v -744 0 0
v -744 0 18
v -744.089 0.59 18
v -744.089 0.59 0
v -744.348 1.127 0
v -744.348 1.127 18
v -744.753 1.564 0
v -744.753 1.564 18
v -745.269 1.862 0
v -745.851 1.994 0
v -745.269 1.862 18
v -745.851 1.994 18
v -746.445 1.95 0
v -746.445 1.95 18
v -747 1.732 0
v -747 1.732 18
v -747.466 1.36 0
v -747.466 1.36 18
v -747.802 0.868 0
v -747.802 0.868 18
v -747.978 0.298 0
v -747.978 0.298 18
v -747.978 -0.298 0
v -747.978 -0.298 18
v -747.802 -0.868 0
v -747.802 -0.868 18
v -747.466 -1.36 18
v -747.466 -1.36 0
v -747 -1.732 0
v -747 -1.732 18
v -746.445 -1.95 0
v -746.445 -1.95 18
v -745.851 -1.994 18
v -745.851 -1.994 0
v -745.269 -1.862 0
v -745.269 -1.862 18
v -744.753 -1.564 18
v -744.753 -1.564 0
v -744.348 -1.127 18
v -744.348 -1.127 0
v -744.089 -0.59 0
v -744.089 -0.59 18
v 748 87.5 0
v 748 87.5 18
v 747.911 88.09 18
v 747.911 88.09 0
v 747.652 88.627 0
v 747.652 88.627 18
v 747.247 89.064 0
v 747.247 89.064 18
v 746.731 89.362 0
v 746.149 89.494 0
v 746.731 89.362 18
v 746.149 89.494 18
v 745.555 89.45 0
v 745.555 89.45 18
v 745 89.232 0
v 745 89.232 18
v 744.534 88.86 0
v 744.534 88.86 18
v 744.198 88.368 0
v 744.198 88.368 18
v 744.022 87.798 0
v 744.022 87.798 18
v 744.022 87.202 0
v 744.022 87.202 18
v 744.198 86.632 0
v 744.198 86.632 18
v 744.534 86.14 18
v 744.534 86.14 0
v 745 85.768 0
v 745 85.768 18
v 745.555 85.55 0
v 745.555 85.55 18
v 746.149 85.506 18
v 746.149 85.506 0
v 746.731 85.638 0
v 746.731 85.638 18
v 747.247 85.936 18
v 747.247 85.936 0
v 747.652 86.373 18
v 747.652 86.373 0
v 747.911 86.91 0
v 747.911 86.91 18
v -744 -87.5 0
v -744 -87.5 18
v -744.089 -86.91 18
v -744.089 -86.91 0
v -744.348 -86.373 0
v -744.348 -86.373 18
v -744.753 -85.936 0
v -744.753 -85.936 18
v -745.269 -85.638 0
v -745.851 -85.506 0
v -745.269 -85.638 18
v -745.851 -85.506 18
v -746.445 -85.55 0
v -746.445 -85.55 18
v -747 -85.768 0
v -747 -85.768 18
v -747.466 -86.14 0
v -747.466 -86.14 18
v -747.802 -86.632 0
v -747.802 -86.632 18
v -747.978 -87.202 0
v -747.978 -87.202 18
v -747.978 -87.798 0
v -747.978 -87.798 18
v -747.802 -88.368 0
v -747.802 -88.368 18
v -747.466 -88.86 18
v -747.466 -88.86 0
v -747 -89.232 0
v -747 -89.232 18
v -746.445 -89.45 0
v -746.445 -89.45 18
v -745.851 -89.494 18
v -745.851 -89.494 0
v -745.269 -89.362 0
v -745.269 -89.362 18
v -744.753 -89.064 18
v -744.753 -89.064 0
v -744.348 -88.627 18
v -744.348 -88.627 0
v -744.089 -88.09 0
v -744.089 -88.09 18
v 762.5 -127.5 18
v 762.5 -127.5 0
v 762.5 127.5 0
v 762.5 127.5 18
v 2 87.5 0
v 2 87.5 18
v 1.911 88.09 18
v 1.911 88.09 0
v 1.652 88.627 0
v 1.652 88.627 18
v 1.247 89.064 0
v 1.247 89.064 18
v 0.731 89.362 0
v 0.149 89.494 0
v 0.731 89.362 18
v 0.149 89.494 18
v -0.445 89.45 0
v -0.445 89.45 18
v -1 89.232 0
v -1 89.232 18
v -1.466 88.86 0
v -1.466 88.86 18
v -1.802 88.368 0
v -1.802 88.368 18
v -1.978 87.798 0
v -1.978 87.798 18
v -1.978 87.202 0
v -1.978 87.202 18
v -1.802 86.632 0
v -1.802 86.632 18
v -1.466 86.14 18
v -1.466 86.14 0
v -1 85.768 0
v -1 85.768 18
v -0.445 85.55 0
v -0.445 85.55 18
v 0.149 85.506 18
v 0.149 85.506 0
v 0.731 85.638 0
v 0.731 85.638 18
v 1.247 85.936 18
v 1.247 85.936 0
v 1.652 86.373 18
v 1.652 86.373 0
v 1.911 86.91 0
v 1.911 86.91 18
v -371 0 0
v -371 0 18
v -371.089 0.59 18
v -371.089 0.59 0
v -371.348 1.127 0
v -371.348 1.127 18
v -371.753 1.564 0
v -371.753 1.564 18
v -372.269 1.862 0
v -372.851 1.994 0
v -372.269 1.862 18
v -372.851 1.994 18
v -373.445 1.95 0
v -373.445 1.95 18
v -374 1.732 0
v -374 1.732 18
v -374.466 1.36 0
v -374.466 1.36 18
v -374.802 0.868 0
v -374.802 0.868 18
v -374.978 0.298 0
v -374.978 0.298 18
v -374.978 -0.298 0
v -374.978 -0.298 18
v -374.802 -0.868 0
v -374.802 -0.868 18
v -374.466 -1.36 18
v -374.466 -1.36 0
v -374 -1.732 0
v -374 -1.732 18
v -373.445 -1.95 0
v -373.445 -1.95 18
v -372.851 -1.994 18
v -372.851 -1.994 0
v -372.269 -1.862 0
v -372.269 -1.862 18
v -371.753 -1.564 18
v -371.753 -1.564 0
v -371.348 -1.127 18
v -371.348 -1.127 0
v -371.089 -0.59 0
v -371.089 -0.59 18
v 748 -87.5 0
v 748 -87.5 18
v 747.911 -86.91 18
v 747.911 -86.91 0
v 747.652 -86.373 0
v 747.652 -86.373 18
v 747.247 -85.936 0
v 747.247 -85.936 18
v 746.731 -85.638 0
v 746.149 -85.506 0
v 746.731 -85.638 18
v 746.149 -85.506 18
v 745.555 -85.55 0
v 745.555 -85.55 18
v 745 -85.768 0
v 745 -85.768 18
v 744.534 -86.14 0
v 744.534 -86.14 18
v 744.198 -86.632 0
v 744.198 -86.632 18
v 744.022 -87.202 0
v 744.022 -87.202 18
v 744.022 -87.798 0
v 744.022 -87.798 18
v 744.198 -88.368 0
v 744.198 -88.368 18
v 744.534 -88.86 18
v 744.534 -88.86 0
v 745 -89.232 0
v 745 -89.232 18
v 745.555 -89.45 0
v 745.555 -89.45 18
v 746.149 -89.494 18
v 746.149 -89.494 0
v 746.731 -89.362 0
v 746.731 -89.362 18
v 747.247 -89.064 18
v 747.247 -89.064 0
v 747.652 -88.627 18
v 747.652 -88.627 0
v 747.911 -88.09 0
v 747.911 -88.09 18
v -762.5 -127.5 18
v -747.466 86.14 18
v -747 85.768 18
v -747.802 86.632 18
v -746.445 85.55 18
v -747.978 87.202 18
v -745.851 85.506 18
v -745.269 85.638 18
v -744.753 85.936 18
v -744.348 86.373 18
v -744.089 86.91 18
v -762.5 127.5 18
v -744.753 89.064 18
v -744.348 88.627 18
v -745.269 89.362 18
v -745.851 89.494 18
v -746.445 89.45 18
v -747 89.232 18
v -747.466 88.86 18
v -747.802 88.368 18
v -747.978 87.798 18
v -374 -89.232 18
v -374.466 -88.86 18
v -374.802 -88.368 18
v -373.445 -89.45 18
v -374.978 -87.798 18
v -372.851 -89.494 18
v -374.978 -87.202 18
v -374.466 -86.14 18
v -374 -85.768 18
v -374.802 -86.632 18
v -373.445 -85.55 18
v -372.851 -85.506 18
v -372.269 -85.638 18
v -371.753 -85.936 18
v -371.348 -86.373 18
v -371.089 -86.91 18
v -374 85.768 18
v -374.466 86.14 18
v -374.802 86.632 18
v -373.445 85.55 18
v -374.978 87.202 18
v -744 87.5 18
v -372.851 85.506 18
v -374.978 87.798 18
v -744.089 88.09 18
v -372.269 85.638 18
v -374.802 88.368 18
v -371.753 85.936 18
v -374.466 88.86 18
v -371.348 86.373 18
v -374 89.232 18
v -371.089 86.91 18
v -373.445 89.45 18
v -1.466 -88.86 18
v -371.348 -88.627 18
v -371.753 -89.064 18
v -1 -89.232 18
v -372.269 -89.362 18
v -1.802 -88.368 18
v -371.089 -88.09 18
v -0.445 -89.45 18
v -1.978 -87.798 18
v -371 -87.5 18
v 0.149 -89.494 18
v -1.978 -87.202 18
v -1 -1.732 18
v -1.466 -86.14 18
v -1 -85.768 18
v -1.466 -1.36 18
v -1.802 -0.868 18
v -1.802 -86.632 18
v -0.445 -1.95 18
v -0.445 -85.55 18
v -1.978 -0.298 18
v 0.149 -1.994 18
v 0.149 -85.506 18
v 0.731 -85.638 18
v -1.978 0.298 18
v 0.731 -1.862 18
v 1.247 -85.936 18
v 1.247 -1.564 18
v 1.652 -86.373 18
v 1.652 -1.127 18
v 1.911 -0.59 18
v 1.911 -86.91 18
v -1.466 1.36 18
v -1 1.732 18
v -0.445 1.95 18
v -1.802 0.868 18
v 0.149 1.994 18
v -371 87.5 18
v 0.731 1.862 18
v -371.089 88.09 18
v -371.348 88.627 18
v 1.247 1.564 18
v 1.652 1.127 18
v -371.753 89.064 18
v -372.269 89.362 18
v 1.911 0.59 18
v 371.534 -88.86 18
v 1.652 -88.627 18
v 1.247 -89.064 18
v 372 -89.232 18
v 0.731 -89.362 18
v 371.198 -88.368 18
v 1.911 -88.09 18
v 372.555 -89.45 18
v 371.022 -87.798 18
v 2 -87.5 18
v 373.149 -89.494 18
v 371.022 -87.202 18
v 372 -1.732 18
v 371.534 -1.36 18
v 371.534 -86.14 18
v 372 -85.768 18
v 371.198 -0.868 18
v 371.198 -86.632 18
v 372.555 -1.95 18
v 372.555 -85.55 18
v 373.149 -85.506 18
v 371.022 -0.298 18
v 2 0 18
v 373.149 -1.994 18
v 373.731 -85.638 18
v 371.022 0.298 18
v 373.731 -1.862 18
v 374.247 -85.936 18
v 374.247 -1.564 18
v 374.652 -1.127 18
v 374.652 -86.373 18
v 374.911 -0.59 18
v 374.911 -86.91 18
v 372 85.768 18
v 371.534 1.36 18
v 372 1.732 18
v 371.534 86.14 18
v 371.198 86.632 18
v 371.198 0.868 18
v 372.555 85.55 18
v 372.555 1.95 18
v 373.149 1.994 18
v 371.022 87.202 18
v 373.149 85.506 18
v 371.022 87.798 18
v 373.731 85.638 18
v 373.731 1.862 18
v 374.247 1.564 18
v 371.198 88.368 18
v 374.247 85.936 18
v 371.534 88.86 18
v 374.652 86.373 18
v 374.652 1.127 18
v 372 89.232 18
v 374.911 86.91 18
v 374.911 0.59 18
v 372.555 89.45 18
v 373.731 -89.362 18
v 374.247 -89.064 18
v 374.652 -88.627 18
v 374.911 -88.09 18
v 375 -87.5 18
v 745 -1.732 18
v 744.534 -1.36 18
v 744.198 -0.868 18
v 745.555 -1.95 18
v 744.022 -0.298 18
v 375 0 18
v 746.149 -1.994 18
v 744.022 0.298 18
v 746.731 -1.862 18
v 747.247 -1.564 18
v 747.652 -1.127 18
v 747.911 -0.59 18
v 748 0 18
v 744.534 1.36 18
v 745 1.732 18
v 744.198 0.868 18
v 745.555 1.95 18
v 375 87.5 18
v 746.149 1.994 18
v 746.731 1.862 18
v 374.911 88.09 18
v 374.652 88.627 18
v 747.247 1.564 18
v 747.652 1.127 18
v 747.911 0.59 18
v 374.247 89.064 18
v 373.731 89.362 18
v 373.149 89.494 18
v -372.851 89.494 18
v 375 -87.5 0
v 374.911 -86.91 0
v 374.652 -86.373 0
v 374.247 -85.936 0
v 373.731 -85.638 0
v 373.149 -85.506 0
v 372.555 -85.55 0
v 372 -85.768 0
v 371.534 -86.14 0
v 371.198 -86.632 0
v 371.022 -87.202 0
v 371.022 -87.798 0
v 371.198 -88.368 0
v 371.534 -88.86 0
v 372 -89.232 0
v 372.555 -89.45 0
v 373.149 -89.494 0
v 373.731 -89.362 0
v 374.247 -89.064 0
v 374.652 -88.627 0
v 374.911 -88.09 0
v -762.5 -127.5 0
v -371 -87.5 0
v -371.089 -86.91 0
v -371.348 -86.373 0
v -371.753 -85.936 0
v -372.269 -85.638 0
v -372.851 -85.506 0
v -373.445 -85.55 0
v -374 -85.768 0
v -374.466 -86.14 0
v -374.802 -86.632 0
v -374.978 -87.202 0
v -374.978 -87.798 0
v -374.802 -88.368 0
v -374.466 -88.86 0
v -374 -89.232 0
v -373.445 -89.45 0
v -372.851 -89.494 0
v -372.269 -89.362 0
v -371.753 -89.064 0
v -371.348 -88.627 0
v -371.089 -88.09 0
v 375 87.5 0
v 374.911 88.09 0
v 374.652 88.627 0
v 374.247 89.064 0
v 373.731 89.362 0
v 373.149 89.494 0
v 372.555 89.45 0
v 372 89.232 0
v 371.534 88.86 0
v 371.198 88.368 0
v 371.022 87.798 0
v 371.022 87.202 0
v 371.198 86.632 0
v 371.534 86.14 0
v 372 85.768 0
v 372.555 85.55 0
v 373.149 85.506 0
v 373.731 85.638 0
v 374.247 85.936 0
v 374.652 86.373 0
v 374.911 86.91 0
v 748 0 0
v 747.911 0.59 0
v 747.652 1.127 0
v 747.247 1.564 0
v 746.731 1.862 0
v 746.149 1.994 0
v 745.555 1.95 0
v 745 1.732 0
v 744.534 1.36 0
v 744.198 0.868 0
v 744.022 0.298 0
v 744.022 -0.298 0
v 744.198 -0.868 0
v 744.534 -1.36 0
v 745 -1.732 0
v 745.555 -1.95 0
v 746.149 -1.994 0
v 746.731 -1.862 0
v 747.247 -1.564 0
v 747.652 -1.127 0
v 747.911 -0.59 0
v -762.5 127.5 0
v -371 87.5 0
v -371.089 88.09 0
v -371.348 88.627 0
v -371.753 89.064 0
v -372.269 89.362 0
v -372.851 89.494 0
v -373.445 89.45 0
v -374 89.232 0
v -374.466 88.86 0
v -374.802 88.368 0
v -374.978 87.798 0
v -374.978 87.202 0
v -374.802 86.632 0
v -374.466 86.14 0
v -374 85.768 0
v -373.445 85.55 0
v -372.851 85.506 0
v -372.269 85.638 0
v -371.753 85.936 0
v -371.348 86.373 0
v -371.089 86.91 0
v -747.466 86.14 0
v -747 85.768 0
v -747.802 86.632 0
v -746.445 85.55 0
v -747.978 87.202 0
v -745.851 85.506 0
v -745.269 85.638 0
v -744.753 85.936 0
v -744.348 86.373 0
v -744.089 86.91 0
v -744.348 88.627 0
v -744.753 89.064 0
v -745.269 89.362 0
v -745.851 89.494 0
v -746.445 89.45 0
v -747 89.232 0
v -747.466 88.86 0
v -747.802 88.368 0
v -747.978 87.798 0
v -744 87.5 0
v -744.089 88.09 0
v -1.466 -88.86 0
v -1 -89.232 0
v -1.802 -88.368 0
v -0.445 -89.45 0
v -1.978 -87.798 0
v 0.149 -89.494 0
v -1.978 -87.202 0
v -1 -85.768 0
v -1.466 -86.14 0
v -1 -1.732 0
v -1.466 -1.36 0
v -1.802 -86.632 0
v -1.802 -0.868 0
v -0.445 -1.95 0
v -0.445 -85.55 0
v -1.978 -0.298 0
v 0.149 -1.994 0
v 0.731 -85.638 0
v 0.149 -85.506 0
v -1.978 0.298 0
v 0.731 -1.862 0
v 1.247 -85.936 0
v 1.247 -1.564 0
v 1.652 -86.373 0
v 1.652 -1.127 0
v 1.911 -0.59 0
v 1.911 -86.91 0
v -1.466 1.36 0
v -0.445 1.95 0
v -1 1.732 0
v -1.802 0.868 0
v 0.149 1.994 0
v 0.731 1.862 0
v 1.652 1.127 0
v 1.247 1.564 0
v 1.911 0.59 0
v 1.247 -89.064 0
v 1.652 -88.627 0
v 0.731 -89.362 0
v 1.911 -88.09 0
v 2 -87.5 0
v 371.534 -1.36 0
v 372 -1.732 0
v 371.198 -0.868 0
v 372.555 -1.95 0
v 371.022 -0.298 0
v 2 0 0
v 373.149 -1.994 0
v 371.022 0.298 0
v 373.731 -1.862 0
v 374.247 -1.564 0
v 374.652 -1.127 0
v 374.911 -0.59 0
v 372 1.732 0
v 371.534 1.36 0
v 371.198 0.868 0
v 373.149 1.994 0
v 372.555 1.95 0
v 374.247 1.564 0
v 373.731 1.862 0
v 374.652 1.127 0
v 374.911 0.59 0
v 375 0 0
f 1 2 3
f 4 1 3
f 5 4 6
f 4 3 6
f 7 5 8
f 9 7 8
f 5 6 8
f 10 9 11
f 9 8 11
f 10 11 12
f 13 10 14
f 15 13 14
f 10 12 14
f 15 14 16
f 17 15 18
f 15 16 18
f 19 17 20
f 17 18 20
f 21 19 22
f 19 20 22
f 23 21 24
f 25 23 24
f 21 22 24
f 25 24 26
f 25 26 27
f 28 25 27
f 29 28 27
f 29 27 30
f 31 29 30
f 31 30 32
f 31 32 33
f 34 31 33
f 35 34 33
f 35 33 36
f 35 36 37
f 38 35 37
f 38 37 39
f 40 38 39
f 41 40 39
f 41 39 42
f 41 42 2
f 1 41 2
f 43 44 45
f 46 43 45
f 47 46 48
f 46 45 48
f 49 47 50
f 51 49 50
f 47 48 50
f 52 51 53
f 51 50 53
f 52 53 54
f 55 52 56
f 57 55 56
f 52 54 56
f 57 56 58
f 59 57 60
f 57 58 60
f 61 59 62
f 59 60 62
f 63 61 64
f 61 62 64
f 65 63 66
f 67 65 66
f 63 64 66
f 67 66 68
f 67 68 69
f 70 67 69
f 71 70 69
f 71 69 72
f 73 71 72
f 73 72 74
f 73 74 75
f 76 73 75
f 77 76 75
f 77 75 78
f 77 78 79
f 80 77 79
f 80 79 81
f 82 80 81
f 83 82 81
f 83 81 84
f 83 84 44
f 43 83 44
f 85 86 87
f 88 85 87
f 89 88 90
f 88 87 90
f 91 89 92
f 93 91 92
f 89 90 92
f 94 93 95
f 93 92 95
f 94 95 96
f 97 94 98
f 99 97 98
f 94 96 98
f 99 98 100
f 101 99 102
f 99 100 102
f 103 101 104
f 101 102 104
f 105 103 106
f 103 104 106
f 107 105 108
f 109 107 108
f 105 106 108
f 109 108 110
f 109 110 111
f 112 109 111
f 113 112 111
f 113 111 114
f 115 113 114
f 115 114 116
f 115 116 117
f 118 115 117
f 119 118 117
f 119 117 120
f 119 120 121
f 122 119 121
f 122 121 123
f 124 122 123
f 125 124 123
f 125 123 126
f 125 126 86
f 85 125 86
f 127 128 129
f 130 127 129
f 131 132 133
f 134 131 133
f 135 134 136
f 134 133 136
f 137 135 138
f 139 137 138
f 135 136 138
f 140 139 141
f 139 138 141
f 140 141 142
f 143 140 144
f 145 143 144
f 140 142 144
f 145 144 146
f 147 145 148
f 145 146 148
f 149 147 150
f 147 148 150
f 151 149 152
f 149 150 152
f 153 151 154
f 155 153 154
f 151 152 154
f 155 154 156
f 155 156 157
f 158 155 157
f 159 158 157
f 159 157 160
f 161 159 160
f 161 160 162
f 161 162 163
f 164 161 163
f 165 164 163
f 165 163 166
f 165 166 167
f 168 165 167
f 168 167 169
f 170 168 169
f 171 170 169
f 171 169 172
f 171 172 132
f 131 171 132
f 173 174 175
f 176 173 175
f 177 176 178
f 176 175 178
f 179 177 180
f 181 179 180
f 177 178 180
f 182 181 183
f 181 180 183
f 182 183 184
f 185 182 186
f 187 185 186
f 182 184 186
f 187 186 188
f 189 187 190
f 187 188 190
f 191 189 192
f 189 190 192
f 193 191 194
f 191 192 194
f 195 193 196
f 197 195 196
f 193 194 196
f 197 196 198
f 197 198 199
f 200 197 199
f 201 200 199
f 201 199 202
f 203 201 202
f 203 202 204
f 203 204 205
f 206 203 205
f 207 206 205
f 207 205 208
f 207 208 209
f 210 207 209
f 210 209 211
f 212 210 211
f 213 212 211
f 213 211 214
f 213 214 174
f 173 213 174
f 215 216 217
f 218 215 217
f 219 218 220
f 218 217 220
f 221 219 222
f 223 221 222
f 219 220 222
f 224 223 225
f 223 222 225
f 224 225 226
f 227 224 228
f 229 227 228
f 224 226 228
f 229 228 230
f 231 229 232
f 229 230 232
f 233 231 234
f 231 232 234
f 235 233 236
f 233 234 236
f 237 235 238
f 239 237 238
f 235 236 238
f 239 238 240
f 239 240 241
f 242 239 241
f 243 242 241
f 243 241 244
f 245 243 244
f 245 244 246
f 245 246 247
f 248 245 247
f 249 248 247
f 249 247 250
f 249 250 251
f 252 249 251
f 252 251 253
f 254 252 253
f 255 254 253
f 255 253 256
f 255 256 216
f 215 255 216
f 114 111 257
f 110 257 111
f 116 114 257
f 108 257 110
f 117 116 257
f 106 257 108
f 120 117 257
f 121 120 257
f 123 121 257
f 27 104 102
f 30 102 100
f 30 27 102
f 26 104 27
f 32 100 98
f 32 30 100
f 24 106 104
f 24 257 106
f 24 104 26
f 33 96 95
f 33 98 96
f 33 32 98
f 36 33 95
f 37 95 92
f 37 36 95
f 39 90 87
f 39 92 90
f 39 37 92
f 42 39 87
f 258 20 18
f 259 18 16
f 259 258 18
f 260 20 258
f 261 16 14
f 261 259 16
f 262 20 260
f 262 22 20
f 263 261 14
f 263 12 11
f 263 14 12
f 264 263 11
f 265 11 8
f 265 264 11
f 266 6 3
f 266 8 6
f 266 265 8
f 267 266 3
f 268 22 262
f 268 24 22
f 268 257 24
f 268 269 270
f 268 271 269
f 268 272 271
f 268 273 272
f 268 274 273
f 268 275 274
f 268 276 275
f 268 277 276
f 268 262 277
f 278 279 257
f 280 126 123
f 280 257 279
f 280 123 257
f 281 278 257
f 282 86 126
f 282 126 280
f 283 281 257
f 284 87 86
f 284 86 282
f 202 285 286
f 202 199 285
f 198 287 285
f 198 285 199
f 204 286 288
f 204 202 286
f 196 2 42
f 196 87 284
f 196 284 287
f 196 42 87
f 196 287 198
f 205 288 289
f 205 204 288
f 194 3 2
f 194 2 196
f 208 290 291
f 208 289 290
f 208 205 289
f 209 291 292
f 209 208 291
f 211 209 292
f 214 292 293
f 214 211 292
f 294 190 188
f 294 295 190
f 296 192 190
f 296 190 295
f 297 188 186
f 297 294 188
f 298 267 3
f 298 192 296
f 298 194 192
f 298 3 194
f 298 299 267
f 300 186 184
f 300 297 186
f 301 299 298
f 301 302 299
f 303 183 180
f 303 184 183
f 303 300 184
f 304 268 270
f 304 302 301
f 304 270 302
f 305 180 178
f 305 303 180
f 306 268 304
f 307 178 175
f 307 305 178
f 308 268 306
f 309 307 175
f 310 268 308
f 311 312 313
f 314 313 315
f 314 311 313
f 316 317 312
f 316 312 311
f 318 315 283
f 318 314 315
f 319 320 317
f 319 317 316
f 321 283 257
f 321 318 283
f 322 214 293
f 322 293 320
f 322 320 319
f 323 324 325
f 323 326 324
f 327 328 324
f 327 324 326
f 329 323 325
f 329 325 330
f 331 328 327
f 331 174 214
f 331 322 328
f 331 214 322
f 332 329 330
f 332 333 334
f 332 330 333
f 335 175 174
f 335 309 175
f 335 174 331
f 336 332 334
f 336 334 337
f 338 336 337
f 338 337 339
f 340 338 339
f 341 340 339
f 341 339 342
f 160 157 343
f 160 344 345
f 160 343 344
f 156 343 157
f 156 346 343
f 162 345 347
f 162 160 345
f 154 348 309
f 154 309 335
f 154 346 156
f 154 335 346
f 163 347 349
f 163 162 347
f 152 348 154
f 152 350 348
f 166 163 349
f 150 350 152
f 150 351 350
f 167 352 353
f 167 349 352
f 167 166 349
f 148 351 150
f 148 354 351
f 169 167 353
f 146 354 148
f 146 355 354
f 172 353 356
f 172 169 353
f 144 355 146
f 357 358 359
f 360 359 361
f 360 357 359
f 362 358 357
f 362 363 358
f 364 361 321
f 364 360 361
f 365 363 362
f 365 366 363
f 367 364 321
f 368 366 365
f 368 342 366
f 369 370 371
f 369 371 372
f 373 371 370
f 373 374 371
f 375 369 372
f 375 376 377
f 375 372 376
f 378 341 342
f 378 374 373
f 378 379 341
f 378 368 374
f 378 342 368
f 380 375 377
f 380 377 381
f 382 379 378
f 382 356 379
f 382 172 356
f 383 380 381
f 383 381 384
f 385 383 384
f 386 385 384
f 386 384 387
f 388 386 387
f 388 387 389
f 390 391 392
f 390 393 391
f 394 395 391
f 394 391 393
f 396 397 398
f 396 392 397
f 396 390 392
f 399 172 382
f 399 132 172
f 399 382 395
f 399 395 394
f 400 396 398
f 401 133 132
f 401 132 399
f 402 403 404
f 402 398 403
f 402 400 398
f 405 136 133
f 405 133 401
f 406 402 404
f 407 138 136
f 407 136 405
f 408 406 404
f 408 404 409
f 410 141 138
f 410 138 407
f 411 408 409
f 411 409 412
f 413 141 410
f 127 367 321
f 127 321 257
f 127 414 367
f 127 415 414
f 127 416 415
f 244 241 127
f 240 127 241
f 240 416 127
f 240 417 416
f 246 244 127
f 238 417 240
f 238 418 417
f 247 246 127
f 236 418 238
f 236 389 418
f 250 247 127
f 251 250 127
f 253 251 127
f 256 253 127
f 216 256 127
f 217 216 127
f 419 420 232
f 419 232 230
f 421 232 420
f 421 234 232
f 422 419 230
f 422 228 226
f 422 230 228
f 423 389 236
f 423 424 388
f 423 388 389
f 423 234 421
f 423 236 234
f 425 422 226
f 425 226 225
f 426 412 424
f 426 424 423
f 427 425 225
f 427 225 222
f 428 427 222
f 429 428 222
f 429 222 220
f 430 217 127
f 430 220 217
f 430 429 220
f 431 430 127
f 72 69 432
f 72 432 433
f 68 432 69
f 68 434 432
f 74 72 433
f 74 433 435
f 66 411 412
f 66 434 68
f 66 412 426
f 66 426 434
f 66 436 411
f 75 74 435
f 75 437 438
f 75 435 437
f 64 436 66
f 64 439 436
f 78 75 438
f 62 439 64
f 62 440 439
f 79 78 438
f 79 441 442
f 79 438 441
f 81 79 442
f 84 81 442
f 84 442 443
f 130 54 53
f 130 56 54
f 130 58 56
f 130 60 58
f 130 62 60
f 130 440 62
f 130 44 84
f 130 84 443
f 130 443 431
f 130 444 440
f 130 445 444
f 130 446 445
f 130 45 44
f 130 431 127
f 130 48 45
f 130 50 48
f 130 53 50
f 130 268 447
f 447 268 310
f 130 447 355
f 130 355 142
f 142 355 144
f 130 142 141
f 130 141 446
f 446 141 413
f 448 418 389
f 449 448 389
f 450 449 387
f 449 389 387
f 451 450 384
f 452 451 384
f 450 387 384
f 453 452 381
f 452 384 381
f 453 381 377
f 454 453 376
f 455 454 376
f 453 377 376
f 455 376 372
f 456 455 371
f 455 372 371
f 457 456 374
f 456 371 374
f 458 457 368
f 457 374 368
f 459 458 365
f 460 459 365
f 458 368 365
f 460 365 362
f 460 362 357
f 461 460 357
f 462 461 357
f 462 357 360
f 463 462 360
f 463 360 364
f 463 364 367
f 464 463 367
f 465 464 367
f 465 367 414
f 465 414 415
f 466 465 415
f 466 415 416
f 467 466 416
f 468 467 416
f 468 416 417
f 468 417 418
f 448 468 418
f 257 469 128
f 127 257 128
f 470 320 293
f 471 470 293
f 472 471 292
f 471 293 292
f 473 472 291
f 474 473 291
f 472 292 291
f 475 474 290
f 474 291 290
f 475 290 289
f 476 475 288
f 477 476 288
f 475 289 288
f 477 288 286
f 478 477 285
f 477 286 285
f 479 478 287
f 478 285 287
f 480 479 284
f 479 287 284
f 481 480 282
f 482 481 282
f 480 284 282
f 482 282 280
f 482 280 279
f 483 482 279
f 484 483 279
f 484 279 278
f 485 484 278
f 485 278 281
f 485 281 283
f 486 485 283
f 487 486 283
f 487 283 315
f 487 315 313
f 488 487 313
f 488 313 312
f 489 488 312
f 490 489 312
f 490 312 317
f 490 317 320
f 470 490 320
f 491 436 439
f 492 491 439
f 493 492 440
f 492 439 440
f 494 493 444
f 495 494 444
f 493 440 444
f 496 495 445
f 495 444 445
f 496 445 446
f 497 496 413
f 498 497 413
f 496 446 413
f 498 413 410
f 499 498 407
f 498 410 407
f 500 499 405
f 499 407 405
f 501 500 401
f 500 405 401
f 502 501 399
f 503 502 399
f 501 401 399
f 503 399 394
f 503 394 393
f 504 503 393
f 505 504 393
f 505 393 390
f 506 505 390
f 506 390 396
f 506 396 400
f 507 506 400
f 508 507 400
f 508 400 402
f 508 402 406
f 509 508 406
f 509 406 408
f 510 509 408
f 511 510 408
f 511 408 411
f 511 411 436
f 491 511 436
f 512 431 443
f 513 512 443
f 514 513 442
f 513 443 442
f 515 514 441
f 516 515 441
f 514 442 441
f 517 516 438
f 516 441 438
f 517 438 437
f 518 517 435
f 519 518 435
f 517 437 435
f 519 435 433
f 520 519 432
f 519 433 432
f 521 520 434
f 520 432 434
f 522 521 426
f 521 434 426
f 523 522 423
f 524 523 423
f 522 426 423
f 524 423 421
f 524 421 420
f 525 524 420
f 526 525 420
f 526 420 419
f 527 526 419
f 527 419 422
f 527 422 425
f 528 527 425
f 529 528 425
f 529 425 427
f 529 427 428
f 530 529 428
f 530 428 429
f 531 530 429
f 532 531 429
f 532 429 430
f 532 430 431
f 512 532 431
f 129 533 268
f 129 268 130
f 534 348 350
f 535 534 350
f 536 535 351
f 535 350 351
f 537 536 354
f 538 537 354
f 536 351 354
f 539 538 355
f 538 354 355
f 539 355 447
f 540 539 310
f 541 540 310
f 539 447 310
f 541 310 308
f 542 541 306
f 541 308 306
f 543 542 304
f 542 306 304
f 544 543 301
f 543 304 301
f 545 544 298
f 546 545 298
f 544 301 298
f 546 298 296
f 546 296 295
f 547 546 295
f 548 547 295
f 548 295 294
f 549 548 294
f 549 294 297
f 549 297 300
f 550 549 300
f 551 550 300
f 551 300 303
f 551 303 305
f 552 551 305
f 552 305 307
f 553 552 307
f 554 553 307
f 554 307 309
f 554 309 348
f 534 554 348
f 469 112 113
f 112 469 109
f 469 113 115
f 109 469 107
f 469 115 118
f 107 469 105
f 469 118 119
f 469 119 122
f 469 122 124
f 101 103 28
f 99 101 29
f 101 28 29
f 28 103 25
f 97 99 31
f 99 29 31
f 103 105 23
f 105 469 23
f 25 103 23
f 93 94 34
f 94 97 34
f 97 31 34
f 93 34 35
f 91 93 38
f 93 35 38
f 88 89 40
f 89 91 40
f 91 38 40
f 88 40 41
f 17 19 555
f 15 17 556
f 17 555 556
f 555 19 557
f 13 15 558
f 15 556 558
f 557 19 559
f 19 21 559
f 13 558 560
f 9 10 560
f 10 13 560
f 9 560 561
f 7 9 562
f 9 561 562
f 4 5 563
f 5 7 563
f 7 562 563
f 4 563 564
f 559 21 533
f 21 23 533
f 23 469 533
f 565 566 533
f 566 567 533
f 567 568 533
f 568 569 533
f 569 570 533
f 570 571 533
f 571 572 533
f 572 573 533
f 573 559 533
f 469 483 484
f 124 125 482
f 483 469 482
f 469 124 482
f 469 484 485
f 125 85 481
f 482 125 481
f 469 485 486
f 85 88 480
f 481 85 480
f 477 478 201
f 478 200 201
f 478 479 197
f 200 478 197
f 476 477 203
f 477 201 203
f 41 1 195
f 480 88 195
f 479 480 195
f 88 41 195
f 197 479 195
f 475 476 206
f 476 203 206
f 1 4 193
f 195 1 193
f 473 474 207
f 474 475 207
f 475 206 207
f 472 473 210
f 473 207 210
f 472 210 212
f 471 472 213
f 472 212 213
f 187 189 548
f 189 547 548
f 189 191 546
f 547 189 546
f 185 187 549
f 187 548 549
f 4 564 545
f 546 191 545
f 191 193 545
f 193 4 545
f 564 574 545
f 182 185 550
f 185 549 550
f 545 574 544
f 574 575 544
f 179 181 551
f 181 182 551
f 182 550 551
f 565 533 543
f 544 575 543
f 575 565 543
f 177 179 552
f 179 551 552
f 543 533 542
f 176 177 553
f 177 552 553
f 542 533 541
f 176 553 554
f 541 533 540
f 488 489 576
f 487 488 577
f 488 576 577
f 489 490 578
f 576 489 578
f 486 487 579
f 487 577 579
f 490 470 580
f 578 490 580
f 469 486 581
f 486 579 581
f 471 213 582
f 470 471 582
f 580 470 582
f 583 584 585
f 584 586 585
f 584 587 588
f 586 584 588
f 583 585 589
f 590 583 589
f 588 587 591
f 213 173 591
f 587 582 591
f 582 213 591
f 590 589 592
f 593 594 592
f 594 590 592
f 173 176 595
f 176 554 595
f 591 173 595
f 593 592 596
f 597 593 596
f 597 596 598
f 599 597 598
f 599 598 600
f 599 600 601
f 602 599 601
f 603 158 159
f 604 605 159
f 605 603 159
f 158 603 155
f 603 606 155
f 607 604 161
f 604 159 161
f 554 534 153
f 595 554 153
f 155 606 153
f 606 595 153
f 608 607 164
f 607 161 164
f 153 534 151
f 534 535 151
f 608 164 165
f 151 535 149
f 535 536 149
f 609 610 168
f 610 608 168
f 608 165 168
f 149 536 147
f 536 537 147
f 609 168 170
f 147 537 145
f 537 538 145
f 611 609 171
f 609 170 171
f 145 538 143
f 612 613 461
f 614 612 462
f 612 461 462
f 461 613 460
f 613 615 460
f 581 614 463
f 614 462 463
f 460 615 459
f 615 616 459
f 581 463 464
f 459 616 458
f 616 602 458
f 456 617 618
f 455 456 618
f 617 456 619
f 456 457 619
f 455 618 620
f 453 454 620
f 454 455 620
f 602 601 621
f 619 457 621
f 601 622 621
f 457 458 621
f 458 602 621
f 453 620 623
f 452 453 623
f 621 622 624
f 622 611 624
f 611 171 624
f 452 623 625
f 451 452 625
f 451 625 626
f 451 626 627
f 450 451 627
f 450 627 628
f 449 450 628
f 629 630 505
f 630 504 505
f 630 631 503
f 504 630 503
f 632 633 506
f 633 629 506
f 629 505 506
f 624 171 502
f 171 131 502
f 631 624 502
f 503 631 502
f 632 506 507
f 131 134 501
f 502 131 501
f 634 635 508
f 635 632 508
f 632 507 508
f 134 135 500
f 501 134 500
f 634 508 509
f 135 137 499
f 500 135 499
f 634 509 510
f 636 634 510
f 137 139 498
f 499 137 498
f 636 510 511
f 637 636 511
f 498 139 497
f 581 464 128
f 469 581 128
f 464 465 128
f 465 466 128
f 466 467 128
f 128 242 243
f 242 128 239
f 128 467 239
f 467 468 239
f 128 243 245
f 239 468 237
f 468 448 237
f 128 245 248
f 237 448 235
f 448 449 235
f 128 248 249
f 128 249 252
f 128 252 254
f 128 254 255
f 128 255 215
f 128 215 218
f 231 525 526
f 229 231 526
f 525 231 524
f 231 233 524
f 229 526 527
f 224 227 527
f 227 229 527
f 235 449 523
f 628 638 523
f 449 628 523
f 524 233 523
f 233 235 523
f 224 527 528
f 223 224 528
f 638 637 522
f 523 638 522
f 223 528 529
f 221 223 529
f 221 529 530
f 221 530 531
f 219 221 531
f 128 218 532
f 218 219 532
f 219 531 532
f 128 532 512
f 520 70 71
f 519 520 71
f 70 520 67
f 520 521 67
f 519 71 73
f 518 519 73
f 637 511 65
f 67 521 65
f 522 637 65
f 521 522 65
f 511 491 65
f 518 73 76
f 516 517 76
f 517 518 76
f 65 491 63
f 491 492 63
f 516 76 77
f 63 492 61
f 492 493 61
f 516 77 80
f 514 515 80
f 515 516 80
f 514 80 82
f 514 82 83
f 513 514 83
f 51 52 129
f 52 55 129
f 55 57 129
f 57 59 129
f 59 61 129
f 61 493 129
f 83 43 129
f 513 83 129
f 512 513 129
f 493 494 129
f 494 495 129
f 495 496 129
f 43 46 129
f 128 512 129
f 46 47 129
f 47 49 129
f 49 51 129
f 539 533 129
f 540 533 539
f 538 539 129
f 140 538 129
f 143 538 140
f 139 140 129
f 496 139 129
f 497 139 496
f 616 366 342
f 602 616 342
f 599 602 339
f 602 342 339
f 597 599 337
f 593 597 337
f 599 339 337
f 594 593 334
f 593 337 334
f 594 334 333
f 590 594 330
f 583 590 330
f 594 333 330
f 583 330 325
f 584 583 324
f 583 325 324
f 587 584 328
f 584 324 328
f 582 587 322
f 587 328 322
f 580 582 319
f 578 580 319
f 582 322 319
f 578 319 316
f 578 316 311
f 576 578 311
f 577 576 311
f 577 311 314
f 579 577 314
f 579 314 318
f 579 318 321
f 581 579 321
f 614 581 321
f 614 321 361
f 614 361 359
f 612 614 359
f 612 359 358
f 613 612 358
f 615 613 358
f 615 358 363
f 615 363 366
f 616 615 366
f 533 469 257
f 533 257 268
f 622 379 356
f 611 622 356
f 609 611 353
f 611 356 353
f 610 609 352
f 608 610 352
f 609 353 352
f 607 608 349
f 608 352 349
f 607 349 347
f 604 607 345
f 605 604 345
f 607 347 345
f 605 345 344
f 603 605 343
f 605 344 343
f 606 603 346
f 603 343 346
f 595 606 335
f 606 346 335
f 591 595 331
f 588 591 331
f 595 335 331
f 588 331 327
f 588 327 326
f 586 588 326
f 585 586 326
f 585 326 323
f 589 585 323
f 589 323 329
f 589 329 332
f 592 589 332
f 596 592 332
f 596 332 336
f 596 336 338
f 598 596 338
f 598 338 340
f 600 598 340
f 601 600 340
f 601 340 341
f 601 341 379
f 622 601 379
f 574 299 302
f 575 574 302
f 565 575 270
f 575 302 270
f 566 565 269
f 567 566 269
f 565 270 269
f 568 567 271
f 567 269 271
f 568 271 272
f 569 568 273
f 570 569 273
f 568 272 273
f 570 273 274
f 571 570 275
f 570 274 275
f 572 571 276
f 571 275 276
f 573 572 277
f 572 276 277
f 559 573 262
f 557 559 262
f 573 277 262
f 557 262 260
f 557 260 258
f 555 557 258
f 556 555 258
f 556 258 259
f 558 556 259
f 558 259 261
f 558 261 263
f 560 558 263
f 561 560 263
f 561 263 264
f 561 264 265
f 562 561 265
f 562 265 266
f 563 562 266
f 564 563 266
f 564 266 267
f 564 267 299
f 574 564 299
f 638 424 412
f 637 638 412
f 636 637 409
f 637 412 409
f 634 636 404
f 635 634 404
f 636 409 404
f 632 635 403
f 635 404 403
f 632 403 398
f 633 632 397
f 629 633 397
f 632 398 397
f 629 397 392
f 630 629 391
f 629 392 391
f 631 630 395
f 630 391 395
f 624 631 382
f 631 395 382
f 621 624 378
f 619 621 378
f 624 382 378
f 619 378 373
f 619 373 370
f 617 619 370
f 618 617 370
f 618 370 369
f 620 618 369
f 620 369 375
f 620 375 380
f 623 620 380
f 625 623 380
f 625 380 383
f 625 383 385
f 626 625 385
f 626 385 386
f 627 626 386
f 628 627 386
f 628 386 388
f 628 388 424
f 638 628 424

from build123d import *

# Parameters (mm, degrees)
SKIZZE1_W                       = 1525
SKIZZE1_H                       = 255
AUFSATZ_LINEAR_AUSTRAGEN1_DEPTH = 18
SCHNITT_LINEAR_AUSTRAGEN1_REACH = 20
SKIZZE3_R                       = 2


with BuildPart() as part:
    # Skizze1 → Aufsatz-Linear austragen1 (new body)
    with BuildSketch(Plane.XY):
        Rectangle(SKIZZE1_W, SKIZZE1_H)
    extrude(amount=AUFSATZ_LINEAR_AUSTRAGEN1_DEPTH)

    # Skizze3 → Schnitt-Linear austragen1 (cut, up to next)
    with BuildSketch(Plane.XY.offset(18), mode=Mode.PRIVATE) as schnitt_linear_austragen1_sk1:
        with Locations((-746, 87.5)):
            Circle(SKIZZE3_R)
    schnitt_linear_austragen1_tool1 = extrude(schnitt_linear_austragen1_sk1.sketch, amount=-SCHNITT_LINEAR_AUSTRAGEN1_REACH, mode=Mode.PRIVATE) & part.part
    add(schnitt_linear_austragen1_tool1.solids().sort_by_distance((-746, 87.5, 18))[0], mode=Mode.SUBTRACT)
    # Skizze3 → Schnitt-Linear austragen1 (cut, up to next)
    with BuildSketch(Plane.XY.offset(18), mode=Mode.PRIVATE) as schnitt_linear_austragen1_sk2:
        with Locations((-746, 0)):
            Circle(SKIZZE3_R)
    schnitt_linear_austragen1_tool2 = extrude(schnitt_linear_austragen1_sk2.sketch, amount=-SCHNITT_LINEAR_AUSTRAGEN1_REACH, mode=Mode.PRIVATE) & part.part
    add(schnitt_linear_austragen1_tool2.solids().sort_by_distance((-746, 0, 18))[0], mode=Mode.SUBTRACT)
    # Skizze3 → Schnitt-Linear austragen1 (cut, up to next)
    with BuildSketch(Plane.XY.offset(18), mode=Mode.PRIVATE) as schnitt_linear_austragen1_sk3:
        with Locations((-746, -87.5)):
            Circle(SKIZZE3_R)
    schnitt_linear_austragen1_tool3 = extrude(schnitt_linear_austragen1_sk3.sketch, amount=-SCHNITT_LINEAR_AUSTRAGEN1_REACH, mode=Mode.PRIVATE) & part.part
    add(schnitt_linear_austragen1_tool3.solids().sort_by_distance((-746, -87.5, 18))[0], mode=Mode.SUBTRACT)
    # Skizze3 → Schnitt-Linear austragen1 (cut, up to next)
    with BuildSketch(Plane.XY.offset(18), mode=Mode.PRIVATE) as schnitt_linear_austragen1_sk4:
        with Locations((-373, -87.5)):
            Circle(SKIZZE3_R)
    schnitt_linear_austragen1_tool4 = extrude(schnitt_linear_austragen1_sk4.sketch, amount=-SCHNITT_LINEAR_AUSTRAGEN1_REACH, mode=Mode.PRIVATE) & part.part
    add(schnitt_linear_austragen1_tool4.solids().sort_by_distance((-373, -87.5, 18))[0], mode=Mode.SUBTRACT)
    # Skizze3 → Schnitt-Linear austragen1 (cut, up to next)
    with BuildSketch(Plane.XY.offset(18), mode=Mode.PRIVATE) as schnitt_linear_austragen1_sk5:
        with Locations((-373, 0)):
            Circle(SKIZZE3_R)
    schnitt_linear_austragen1_tool5 = extrude(schnitt_linear_austragen1_sk5.sketch, amount=-SCHNITT_LINEAR_AUSTRAGEN1_REACH, mode=Mode.PRIVATE) & part.part
    add(schnitt_linear_austragen1_tool5.solids().sort_by_distance((-373, 0, 18))[0], mode=Mode.SUBTRACT)
    # Skizze3 → Schnitt-Linear austragen1 (cut, up to next)
    with BuildSketch(Plane.XY.offset(18), mode=Mode.PRIVATE) as schnitt_linear_austragen1_sk6:
        with Locations((-373, 87.5)):
            Circle(SKIZZE3_R)
    schnitt_linear_austragen1_tool6 = extrude(schnitt_linear_austragen1_sk6.sketch, amount=-SCHNITT_LINEAR_AUSTRAGEN1_REACH, mode=Mode.PRIVATE) & part.part
    add(schnitt_linear_austragen1_tool6.solids().sort_by_distance((-373, 87.5, 18))[0], mode=Mode.SUBTRACT)
    # Skizze3 → Schnitt-Linear austragen1 (cut, up to next)
    with BuildSketch(Plane.XY.offset(18), mode=Mode.PRIVATE) as schnitt_linear_austragen1_sk7:
        with Locations((0, -87.5)):
            Circle(SKIZZE3_R)
    schnitt_linear_austragen1_tool7 = extrude(schnitt_linear_austragen1_sk7.sketch, amount=-SCHNITT_LINEAR_AUSTRAGEN1_REACH, mode=Mode.PRIVATE) & part.part
    add(schnitt_linear_austragen1_tool7.solids().sort_by_distance((0, -87.5, 18))[0], mode=Mode.SUBTRACT)
    # Skizze3 → Schnitt-Linear austragen1 (cut, up to next)
    with BuildSketch(Plane.XY.offset(18), mode=Mode.PRIVATE) as schnitt_linear_austragen1_sk8:
        Circle(SKIZZE3_R)
    schnitt_linear_austragen1_tool8 = extrude(schnitt_linear_austragen1_sk8.sketch, amount=-SCHNITT_LINEAR_AUSTRAGEN1_REACH, mode=Mode.PRIVATE) & part.part
    add(schnitt_linear_austragen1_tool8.solids().sort_by_distance((0, 0, 18))[0], mode=Mode.SUBTRACT)
    # Skizze3 → Schnitt-Linear austragen1 (cut, up to next)
    with BuildSketch(Plane.XY.offset(18), mode=Mode.PRIVATE) as schnitt_linear_austragen1_sk9:
        with Locations((0, 87.5)):
            Circle(SKIZZE3_R)
    schnitt_linear_austragen1_tool9 = extrude(schnitt_linear_austragen1_sk9.sketch, amount=-SCHNITT_LINEAR_AUSTRAGEN1_REACH, mode=Mode.PRIVATE) & part.part
    add(schnitt_linear_austragen1_tool9.solids().sort_by_distance((0, 87.5, 18))[0], mode=Mode.SUBTRACT)
    # Skizze3 → Schnitt-Linear austragen1 (cut, up to next)
    with BuildSketch(Plane.XY.offset(18), mode=Mode.PRIVATE) as schnitt_linear_austragen1_sk10:
        with Locations((373, -87.5)):
            Circle(SKIZZE3_R)
    schnitt_linear_austragen1_tool10 = extrude(schnitt_linear_austragen1_sk10.sketch, amount=-SCHNITT_LINEAR_AUSTRAGEN1_REACH, mode=Mode.PRIVATE) & part.part
    add(schnitt_linear_austragen1_tool10.solids().sort_by_distance((373, -87.5, 18))[0], mode=Mode.SUBTRACT)
    # Skizze3 → Schnitt-Linear austragen1 (cut, up to next)
    with BuildSketch(Plane.XY.offset(18), mode=Mode.PRIVATE) as schnitt_linear_austragen1_sk11:
        with Locations((373, 0)):
            Circle(SKIZZE3_R)
    schnitt_linear_austragen1_tool11 = extrude(schnitt_linear_austragen1_sk11.sketch, amount=-SCHNITT_LINEAR_AUSTRAGEN1_REACH, mode=Mode.PRIVATE) & part.part
    add(schnitt_linear_austragen1_tool11.solids().sort_by_distance((373, 0, 18))[0], mode=Mode.SUBTRACT)
    # Skizze3 → Schnitt-Linear austragen1 (cut, up to next)
    with BuildSketch(Plane.XY.offset(18), mode=Mode.PRIVATE) as schnitt_linear_austragen1_sk12:
        with Locations((373, 87.5)):
            Circle(SKIZZE3_R)
    schnitt_linear_austragen1_tool12 = extrude(schnitt_linear_austragen1_sk12.sketch, amount=-SCHNITT_LINEAR_AUSTRAGEN1_REACH, mode=Mode.PRIVATE) & part.part
    add(schnitt_linear_austragen1_tool12.solids().sort_by_distance((373, 87.5, 18))[0], mode=Mode.SUBTRACT)
    # Skizze3 → Schnitt-Linear austragen1 (cut, up to next)
    with BuildSketch(Plane.XY.offset(18), mode=Mode.PRIVATE) as schnitt_linear_austragen1_sk13:
        with Locations((746, -87.5)):
            Circle(SKIZZE3_R)
    schnitt_linear_austragen1_tool13 = extrude(schnitt_linear_austragen1_sk13.sketch, amount=-SCHNITT_LINEAR_AUSTRAGEN1_REACH, mode=Mode.PRIVATE) & part.part
    add(schnitt_linear_austragen1_tool13.solids().sort_by_distance((746, -87.5, 18))[0], mode=Mode.SUBTRACT)
    # Skizze3 → Schnitt-Linear austragen1 (cut, up to next)
    with BuildSketch(Plane.XY.offset(18), mode=Mode.PRIVATE) as schnitt_linear_austragen1_sk14:
        with Locations((746, 0)):
            Circle(SKIZZE3_R)
    schnitt_linear_austragen1_tool14 = extrude(schnitt_linear_austragen1_sk14.sketch, amount=-SCHNITT_LINEAR_AUSTRAGEN1_REACH, mode=Mode.PRIVATE) & part.part
    add(schnitt_linear_austragen1_tool14.solids().sort_by_distance((746, 0, 18))[0], mode=Mode.SUBTRACT)
    # Skizze3 → Schnitt-Linear austragen1 (cut, up to next)
    with BuildSketch(Plane.XY.offset(18), mode=Mode.PRIVATE) as schnitt_linear_austragen1_sk15:
        with Locations((746, 87.5)):
            Circle(SKIZZE3_R)
    schnitt_linear_austragen1_tool15 = extrude(schnitt_linear_austragen1_sk15.sketch, amount=-SCHNITT_LINEAR_AUSTRAGEN1_REACH, mode=Mode.PRIVATE) & part.part
    add(schnitt_linear_austragen1_tool15.solids().sort_by_distance((746, 87.5, 18))[0], mode=Mode.SUBTRACT)


solid = part.part
